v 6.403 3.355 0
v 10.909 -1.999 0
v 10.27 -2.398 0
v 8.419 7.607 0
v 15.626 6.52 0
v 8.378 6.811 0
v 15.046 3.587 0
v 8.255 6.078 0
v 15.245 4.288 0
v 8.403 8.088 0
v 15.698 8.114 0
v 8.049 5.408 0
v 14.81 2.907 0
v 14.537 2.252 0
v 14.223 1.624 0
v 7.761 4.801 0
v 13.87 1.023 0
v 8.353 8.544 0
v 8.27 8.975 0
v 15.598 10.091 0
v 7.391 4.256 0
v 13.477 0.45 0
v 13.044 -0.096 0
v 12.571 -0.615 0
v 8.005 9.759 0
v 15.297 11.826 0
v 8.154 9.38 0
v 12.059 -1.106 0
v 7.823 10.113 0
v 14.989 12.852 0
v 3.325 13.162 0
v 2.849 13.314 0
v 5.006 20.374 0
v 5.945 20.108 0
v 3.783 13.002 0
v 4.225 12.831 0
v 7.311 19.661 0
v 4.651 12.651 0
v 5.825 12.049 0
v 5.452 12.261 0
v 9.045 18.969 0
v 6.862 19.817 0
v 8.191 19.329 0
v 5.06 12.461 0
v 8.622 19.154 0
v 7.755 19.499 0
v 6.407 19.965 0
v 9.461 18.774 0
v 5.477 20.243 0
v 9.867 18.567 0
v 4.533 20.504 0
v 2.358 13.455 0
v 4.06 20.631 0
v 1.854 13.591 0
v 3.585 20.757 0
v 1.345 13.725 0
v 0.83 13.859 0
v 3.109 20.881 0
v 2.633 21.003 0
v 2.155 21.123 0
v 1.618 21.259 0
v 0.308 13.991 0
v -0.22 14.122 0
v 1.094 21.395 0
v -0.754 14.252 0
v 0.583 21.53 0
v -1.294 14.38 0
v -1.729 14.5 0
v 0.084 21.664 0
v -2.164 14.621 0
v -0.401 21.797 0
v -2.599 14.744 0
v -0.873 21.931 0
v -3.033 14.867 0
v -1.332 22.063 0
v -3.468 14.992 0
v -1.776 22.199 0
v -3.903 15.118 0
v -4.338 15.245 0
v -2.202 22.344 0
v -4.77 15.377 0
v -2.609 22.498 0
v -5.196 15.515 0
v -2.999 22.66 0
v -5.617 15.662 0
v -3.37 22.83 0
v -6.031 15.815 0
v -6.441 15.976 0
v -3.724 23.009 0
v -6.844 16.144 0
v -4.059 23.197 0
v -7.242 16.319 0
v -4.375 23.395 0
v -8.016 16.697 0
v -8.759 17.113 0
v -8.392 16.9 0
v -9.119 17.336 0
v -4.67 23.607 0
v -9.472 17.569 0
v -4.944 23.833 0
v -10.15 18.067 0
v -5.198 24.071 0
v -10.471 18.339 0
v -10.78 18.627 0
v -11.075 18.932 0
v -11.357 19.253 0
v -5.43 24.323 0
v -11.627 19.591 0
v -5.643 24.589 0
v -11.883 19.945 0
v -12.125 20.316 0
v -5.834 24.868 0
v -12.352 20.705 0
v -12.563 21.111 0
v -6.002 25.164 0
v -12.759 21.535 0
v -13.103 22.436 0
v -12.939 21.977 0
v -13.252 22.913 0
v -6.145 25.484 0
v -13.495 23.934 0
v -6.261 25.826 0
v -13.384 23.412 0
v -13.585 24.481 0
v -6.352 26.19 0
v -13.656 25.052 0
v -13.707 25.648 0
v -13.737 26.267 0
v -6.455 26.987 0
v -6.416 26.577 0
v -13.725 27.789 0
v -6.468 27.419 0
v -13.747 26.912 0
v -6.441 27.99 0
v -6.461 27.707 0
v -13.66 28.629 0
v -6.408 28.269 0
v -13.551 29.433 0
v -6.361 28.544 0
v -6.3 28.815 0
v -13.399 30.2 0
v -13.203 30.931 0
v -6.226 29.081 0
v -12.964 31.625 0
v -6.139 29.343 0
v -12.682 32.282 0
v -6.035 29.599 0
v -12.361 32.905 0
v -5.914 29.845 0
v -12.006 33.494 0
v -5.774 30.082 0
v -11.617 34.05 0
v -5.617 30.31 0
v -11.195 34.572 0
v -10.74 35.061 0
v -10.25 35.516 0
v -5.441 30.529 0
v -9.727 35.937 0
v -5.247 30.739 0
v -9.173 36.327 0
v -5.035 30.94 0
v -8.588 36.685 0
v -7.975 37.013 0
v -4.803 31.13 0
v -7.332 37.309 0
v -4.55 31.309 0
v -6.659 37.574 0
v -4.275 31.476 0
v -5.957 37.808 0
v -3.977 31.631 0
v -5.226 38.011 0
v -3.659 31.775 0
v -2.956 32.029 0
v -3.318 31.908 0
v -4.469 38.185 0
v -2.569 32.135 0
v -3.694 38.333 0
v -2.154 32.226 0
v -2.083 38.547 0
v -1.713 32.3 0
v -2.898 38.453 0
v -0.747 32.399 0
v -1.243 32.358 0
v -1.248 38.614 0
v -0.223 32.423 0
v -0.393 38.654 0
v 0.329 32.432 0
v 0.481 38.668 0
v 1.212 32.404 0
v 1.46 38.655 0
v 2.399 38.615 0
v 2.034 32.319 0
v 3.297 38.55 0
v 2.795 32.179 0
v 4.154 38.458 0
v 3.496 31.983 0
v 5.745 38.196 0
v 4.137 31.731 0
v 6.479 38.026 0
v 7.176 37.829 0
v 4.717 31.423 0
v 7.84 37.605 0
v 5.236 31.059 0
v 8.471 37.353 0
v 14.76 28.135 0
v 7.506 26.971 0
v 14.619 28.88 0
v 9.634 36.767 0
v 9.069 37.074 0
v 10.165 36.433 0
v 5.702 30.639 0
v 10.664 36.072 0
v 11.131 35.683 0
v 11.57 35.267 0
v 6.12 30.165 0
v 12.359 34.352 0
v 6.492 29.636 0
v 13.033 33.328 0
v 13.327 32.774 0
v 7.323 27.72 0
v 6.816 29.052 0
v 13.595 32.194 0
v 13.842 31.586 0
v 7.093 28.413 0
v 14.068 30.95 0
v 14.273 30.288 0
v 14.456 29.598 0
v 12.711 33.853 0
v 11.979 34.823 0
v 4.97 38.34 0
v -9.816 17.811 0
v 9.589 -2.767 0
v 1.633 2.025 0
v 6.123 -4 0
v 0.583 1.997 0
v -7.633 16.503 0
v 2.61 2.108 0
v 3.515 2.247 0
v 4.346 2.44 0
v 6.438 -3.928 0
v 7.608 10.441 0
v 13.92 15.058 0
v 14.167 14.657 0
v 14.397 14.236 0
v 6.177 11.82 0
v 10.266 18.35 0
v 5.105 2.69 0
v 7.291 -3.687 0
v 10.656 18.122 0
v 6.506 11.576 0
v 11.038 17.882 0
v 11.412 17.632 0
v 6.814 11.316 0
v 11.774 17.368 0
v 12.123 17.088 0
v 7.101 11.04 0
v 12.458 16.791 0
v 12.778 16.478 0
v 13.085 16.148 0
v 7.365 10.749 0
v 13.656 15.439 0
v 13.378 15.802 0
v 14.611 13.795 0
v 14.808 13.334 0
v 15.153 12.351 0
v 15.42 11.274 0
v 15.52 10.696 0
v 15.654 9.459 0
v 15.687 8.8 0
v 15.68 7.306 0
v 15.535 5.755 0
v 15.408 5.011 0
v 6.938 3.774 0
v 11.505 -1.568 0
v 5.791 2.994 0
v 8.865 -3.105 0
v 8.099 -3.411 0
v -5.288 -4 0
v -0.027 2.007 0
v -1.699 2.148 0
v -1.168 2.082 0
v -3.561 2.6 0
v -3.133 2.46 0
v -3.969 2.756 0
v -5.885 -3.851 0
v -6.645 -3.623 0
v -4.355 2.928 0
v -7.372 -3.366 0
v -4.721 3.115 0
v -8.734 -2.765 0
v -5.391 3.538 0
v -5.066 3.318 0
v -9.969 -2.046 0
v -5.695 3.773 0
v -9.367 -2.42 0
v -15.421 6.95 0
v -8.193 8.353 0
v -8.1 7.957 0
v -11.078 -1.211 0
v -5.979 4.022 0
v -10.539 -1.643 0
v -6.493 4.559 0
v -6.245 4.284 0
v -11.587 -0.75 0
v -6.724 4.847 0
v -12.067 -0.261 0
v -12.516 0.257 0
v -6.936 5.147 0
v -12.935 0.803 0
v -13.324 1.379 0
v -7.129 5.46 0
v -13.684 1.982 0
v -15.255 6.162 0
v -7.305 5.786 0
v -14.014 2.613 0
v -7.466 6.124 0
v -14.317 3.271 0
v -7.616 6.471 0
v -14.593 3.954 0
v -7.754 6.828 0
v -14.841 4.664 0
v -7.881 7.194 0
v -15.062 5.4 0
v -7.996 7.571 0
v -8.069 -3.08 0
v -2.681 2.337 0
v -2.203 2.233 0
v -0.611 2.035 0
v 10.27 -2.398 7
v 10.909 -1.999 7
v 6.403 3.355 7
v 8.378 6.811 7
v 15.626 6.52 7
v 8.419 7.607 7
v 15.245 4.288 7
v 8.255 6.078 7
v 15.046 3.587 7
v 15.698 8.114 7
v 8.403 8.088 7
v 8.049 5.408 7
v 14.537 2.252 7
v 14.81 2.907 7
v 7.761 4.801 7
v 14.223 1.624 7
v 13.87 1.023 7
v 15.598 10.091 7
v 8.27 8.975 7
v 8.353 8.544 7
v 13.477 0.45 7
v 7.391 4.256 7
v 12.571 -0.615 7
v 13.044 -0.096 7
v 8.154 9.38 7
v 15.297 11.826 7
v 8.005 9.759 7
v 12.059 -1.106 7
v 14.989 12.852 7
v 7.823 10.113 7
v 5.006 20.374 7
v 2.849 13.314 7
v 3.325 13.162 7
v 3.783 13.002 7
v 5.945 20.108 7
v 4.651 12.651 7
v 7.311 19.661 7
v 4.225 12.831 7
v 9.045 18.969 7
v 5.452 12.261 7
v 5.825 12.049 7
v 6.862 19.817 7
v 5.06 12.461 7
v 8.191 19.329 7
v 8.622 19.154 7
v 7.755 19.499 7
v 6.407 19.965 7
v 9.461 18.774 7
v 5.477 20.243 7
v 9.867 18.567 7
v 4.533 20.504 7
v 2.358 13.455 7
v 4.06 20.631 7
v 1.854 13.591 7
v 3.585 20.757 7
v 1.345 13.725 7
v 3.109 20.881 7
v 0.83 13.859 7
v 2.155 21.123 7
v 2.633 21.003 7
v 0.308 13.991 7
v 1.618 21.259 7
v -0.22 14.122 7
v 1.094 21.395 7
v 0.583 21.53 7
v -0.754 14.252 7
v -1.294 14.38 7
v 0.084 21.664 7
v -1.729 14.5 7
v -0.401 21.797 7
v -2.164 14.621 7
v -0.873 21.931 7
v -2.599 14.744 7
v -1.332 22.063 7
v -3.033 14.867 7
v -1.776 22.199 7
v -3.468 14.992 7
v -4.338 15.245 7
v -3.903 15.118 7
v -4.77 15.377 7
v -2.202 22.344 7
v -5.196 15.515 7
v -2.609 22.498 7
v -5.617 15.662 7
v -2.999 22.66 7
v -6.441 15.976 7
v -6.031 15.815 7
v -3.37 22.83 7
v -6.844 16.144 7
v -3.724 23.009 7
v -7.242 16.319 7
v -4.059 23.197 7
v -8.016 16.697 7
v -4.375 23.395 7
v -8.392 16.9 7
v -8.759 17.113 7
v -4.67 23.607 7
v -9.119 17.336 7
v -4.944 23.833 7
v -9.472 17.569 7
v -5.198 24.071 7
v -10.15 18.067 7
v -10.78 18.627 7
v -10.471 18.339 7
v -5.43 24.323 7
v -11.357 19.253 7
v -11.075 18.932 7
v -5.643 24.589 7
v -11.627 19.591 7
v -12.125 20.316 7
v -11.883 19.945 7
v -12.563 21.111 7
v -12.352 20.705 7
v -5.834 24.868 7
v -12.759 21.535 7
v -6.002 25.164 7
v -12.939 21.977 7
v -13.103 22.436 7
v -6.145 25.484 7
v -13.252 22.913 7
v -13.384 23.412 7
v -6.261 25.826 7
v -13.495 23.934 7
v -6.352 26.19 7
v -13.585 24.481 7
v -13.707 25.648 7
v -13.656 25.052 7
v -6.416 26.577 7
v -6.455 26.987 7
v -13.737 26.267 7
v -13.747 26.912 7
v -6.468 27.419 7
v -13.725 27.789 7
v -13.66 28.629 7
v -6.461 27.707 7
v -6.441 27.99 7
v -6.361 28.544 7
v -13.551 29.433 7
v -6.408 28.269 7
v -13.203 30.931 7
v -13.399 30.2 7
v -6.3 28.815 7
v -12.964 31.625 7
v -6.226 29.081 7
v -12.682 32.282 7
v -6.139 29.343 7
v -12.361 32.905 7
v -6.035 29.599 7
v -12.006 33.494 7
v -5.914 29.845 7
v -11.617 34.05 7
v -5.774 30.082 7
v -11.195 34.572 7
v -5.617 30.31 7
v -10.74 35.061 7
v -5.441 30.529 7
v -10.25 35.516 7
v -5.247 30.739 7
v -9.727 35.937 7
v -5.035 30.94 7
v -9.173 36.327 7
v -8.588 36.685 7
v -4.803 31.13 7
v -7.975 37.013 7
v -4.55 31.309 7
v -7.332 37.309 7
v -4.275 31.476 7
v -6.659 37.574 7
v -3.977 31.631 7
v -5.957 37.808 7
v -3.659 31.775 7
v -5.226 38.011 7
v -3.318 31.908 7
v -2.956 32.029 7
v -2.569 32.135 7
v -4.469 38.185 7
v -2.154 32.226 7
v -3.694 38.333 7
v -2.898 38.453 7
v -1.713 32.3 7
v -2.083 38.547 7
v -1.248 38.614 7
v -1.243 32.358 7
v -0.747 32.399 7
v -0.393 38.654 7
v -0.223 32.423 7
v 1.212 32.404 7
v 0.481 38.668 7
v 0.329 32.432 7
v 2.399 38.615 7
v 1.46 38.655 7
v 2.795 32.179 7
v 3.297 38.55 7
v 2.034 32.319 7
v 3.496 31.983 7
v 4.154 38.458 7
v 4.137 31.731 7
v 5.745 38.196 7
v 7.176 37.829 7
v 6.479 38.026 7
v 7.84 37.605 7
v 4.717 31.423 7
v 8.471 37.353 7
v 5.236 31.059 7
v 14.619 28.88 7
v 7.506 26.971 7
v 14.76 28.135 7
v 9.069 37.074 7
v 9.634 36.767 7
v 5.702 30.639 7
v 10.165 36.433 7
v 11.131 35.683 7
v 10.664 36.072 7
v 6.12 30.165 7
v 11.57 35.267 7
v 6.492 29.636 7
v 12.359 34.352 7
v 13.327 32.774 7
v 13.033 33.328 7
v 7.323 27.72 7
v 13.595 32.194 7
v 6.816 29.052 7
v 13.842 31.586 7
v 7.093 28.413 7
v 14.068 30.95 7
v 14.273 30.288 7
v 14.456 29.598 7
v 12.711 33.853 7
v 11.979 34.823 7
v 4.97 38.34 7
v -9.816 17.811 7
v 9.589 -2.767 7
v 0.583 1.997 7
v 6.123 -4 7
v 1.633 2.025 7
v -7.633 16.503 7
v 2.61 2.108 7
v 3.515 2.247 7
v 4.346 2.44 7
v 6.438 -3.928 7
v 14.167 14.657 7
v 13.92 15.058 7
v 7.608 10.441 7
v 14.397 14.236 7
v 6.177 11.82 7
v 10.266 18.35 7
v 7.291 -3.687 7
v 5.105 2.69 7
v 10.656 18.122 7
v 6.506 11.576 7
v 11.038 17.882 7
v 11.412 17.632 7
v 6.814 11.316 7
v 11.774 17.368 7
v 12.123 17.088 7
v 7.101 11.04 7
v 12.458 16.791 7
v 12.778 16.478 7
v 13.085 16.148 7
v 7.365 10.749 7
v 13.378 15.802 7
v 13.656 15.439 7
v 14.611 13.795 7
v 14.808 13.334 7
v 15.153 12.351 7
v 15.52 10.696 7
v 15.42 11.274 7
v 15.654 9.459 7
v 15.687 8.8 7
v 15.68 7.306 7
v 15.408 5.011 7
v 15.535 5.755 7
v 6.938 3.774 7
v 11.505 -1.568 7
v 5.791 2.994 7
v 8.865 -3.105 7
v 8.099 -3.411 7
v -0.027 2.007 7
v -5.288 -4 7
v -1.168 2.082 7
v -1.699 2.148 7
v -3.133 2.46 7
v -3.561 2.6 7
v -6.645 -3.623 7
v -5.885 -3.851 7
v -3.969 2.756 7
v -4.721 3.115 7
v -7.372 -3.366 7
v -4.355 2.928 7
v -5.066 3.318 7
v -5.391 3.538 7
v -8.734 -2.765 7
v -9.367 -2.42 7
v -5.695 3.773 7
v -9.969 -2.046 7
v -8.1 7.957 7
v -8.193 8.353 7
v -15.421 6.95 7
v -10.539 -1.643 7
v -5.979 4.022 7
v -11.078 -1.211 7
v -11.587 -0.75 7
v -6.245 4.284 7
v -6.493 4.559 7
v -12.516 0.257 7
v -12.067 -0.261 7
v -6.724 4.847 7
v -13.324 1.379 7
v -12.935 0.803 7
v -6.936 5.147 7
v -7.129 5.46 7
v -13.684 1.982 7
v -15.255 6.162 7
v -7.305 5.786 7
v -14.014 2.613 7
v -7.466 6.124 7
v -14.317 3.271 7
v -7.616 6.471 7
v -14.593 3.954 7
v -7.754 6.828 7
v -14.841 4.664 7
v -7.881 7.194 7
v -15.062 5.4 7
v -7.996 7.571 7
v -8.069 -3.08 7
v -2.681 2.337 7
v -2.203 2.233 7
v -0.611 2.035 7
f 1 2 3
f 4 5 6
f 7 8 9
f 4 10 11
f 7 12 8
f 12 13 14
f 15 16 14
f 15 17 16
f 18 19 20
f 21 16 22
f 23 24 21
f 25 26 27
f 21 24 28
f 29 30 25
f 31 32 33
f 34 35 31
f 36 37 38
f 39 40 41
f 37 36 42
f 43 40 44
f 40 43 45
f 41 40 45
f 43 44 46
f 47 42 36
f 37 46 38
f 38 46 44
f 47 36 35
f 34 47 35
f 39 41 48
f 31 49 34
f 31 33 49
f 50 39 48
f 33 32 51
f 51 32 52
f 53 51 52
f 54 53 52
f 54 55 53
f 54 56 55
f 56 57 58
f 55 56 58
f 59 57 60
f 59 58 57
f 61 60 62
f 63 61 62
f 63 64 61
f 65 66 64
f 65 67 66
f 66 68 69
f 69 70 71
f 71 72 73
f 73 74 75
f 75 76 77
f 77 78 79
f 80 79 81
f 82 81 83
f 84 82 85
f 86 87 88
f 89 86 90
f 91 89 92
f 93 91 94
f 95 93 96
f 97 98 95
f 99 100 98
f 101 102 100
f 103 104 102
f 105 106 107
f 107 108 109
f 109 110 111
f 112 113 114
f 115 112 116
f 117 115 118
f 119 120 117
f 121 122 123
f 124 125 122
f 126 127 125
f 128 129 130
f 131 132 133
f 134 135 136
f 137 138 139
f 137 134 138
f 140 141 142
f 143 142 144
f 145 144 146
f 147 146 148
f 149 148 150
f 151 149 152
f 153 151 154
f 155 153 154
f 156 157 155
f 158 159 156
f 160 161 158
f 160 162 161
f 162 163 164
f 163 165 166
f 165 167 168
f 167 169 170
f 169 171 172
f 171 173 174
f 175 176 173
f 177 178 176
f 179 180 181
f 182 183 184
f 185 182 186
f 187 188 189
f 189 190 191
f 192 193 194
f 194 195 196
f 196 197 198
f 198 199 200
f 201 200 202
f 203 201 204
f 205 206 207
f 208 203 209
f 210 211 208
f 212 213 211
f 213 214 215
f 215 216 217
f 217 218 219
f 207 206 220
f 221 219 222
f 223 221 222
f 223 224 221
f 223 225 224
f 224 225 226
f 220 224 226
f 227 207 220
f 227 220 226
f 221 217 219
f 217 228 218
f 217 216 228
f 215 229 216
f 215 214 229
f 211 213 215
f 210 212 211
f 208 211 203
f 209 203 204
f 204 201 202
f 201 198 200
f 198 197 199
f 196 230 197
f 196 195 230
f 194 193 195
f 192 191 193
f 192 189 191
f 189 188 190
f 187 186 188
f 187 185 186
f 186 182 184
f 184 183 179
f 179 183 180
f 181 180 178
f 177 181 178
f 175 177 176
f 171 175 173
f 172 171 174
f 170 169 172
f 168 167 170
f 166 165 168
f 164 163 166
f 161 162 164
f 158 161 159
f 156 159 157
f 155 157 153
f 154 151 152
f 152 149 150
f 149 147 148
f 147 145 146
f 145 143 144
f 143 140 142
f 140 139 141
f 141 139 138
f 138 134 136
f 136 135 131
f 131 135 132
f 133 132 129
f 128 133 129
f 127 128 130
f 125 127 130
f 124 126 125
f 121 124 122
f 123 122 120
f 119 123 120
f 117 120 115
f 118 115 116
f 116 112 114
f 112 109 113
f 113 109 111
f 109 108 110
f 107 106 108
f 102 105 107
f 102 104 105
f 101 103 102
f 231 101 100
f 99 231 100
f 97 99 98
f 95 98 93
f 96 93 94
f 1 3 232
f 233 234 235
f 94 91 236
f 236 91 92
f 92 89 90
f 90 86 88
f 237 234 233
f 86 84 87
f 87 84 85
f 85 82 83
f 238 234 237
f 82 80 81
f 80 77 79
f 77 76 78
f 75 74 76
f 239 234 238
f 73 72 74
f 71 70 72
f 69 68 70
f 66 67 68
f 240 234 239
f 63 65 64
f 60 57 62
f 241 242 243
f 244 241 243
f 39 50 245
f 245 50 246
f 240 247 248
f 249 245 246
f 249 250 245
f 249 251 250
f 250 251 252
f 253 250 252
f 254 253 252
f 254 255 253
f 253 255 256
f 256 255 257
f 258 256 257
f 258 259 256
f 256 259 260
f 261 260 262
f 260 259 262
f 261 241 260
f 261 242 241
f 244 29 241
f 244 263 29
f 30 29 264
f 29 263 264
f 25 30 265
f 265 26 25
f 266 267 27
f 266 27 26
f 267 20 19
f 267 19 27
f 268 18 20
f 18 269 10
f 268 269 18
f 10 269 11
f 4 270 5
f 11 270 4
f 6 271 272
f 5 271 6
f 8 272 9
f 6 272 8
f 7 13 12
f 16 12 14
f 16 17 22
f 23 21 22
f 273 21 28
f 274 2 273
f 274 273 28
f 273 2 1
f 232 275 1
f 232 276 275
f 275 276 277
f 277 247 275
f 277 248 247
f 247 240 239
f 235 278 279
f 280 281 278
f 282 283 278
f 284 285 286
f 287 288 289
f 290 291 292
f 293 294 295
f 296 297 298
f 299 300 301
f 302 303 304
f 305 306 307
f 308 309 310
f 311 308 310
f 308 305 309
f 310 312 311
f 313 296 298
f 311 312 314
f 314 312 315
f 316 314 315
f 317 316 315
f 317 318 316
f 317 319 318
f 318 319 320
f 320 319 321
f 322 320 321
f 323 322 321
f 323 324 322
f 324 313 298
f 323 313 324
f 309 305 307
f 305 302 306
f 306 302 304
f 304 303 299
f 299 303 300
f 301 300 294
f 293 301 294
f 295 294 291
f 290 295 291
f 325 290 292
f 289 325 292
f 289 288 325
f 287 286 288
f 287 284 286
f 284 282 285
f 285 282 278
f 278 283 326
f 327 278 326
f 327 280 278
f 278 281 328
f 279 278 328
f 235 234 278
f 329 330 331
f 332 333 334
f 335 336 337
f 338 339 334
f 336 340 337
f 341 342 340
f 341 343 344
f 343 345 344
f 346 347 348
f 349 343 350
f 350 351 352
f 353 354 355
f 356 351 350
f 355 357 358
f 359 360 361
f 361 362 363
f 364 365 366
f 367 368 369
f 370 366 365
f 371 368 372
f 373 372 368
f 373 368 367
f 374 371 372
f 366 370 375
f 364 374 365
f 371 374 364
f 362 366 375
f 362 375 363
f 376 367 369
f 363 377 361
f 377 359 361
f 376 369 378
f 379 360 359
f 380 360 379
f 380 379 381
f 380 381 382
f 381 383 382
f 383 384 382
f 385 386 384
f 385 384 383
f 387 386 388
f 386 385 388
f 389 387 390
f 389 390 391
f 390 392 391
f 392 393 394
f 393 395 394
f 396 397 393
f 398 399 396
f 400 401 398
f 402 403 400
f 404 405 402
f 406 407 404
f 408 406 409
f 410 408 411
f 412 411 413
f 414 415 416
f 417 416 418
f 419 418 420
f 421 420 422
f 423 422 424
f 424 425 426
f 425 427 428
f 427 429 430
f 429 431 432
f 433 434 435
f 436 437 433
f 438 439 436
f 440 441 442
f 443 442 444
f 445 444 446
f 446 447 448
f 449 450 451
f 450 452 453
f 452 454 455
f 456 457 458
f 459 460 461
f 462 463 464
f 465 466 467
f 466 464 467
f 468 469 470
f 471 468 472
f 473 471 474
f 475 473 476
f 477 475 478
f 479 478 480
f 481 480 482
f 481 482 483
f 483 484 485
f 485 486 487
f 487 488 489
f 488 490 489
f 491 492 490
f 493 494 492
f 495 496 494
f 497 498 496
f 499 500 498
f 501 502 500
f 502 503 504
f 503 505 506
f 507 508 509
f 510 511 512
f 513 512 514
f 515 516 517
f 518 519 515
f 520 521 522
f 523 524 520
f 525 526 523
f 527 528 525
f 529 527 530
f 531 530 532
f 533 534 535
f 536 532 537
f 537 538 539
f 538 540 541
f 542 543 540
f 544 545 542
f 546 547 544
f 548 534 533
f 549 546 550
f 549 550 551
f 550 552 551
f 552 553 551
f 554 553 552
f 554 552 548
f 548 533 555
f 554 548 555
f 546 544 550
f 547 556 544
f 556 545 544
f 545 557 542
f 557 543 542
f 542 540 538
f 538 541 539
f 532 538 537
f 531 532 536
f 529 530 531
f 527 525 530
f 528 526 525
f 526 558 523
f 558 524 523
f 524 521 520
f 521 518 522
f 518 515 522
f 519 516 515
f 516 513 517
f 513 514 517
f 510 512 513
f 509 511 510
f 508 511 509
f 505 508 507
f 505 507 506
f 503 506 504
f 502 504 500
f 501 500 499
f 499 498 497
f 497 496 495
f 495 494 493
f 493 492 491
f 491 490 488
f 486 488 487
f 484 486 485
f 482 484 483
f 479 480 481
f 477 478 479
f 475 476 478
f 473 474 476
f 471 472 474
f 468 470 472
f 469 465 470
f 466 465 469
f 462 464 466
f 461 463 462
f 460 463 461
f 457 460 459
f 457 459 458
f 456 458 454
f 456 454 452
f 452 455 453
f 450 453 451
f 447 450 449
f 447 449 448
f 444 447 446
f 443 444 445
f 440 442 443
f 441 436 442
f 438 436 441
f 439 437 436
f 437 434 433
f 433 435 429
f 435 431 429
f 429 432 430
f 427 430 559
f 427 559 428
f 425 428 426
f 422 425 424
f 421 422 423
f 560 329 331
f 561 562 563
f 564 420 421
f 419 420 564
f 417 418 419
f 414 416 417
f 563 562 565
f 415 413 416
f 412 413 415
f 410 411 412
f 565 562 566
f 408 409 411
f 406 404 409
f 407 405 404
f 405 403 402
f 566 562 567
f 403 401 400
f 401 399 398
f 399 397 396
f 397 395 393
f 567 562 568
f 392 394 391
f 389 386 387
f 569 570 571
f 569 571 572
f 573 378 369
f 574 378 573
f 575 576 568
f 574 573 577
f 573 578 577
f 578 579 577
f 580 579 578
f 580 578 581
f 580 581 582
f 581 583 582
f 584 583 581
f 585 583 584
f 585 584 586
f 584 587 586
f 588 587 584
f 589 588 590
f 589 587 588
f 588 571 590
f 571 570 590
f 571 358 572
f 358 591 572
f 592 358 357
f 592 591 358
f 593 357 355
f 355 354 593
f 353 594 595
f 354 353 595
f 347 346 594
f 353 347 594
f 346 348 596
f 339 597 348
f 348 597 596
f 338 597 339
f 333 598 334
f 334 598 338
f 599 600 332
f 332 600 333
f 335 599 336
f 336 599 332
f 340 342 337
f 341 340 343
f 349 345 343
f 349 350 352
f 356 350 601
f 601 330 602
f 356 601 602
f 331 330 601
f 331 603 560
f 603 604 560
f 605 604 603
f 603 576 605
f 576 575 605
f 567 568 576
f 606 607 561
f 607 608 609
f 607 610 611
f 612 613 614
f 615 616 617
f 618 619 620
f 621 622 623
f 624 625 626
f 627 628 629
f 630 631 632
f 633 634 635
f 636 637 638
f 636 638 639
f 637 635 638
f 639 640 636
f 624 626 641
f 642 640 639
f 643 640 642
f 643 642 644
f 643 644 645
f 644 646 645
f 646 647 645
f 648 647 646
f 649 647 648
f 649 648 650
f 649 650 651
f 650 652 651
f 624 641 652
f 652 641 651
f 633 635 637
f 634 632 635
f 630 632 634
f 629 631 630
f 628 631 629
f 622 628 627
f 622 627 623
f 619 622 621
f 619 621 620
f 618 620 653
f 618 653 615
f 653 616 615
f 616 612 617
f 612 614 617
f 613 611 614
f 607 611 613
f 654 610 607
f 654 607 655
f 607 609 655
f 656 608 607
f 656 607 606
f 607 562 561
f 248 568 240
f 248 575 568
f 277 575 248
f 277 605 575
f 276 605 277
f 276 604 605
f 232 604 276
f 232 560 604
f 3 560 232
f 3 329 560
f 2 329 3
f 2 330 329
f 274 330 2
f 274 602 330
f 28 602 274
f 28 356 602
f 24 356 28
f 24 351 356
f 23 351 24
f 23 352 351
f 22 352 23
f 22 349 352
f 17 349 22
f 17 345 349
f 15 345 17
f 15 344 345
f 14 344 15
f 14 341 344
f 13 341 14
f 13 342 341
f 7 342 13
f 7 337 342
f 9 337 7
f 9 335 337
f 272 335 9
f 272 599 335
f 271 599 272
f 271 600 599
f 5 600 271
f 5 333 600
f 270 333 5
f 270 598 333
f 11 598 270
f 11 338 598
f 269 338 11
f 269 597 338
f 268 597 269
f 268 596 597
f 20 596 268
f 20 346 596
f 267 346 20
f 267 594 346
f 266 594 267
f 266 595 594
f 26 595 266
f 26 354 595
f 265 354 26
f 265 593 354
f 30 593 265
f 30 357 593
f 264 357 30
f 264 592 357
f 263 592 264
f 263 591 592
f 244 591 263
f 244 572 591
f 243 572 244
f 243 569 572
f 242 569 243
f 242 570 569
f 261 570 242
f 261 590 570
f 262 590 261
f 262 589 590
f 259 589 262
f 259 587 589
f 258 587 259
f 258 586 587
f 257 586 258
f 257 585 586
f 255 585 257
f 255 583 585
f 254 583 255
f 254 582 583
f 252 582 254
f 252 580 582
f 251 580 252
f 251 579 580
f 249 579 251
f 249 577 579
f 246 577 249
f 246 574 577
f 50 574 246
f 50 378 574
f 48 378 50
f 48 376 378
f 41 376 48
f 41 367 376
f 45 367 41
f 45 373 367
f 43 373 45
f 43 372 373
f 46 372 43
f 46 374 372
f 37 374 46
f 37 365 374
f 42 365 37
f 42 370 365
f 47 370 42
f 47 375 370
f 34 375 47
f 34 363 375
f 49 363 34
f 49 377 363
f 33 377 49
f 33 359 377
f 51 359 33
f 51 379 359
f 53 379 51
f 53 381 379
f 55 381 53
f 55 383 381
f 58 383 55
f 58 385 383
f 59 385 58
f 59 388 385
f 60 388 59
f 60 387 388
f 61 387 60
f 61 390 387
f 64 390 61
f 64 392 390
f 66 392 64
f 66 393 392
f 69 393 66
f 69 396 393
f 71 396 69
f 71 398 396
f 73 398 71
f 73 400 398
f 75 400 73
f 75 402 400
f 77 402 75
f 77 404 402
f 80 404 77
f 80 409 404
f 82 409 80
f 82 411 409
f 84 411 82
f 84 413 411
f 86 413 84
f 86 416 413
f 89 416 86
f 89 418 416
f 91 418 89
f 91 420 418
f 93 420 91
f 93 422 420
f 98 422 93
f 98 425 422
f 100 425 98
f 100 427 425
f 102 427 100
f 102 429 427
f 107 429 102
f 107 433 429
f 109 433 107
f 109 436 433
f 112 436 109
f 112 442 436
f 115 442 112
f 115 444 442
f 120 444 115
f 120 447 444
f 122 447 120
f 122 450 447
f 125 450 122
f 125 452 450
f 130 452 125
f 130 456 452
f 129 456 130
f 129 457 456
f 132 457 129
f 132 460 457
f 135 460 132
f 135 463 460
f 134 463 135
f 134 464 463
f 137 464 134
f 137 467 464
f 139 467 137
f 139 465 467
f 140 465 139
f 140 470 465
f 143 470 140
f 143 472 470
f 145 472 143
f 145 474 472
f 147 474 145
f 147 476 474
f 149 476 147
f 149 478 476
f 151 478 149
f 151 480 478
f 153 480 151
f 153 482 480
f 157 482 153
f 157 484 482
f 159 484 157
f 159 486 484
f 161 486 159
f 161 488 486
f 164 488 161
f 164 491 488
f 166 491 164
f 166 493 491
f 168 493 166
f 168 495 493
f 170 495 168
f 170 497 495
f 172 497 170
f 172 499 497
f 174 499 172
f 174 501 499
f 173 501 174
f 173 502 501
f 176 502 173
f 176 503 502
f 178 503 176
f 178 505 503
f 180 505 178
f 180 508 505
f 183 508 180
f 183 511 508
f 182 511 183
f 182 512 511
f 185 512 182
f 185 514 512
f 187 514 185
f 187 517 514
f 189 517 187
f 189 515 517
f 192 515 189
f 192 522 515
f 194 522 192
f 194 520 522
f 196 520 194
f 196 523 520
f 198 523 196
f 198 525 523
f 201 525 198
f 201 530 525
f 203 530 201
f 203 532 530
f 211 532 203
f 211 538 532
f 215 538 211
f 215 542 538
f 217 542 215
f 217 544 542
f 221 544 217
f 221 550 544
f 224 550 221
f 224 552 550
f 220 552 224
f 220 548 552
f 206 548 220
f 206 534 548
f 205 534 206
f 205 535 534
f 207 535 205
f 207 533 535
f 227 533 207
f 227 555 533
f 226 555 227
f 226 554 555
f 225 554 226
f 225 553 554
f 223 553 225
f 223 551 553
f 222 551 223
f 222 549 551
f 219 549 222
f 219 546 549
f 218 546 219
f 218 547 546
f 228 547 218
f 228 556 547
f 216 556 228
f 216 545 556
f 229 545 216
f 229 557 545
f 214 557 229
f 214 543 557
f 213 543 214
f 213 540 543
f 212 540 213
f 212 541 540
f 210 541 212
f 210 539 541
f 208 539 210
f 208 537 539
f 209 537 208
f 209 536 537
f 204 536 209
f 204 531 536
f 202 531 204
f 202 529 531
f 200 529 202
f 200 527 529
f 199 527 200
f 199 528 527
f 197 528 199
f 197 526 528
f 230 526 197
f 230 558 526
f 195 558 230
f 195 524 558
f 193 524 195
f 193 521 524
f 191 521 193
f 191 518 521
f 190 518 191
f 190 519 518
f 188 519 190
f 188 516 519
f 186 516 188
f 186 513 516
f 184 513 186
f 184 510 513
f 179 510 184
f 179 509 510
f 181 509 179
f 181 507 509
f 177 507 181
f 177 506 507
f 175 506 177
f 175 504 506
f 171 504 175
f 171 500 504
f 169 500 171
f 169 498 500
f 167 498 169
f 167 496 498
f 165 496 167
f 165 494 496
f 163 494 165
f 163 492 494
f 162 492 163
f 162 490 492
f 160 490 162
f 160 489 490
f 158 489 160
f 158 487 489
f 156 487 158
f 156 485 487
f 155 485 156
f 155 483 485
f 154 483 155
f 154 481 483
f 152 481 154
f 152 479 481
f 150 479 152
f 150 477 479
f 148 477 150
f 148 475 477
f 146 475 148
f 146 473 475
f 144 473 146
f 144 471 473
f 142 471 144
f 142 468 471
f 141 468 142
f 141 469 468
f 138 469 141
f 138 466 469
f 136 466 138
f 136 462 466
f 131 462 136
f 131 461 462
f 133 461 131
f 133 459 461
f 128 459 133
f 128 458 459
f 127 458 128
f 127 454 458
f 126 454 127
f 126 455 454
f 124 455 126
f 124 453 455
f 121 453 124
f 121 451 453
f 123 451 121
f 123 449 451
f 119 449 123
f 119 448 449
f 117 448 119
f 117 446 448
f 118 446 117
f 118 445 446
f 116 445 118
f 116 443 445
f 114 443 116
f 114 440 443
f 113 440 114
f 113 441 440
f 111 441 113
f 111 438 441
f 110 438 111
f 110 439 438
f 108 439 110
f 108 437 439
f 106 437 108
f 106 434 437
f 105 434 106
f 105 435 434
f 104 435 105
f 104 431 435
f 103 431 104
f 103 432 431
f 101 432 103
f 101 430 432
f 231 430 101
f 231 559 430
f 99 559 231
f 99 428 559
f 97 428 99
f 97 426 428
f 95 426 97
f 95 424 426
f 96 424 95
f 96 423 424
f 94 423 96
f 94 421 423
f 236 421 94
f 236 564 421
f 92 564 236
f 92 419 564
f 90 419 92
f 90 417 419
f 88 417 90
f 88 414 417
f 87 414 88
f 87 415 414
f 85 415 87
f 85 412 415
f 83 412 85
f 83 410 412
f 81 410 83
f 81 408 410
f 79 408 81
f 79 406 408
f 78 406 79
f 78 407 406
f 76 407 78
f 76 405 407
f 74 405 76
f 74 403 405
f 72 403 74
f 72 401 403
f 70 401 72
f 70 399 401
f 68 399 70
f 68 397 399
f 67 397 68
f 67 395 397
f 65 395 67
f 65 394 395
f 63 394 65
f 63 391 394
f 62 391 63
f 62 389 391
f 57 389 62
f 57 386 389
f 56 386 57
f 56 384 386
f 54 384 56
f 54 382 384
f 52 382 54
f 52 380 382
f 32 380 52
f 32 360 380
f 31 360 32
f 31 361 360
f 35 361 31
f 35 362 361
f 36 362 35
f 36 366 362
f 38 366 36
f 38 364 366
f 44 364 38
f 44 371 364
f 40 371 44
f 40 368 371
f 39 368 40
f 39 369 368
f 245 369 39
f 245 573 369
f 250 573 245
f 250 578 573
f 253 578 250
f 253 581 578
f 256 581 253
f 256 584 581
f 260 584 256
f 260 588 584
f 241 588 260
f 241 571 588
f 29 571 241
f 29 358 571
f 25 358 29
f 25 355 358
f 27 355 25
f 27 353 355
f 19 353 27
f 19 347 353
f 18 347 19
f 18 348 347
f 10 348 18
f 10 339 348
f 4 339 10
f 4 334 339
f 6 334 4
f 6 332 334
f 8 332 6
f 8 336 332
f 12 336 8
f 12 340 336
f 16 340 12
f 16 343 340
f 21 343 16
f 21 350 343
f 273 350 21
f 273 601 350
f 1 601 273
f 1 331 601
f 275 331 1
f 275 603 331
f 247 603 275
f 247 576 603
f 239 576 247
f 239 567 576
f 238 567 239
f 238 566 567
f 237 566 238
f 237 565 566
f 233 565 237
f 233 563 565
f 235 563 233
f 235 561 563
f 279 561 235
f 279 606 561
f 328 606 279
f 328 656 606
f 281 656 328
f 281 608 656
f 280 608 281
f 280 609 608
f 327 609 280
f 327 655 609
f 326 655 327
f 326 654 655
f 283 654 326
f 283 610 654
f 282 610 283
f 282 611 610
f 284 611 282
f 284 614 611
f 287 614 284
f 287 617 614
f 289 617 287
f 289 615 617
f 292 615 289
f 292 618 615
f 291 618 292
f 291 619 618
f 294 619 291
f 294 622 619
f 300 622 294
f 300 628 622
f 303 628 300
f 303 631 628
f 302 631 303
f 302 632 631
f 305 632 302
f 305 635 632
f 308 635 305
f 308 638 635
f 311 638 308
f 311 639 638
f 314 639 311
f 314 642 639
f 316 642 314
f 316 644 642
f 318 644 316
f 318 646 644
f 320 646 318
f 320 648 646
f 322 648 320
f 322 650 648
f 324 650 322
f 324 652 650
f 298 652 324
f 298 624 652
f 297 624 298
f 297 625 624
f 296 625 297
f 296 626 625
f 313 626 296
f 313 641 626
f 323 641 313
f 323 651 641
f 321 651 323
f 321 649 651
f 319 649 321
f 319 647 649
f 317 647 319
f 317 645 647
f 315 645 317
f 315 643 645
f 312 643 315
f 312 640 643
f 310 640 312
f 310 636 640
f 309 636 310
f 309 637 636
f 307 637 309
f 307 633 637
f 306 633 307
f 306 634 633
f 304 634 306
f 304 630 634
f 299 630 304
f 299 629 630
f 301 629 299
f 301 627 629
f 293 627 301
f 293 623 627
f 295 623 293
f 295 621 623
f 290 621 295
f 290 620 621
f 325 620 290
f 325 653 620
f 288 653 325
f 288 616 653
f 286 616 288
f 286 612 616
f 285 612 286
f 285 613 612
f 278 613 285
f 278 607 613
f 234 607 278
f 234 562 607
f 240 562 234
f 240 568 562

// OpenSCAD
// file: glyph.scad
// glyph — the shared geometry of every letter in the set. Defines named geometry
// only, so it renders nothing on its own; each letter part includes it and calls
// letter(). Every dimension lives in ../../lib/common.scad.
//
// A LETTER IS NOTHING BUT A LETTER. No plinth, no tongue, no tab — it is the
// bare glyph, and it attaches by standing in the deck groove and resting on the
// groove's floor. Anything else on it would be a distraction on a learning toy.
//
// It is a flat plate of one thickness, printed face-down: no overhang anywhere,
// no supports, and the face on the bed comes out smoothest.
//
// TWO TRAPS WITH text():
//
//  * A missing font FALLS BACK SILENTLY — no warning, no error, just different
//    letters. "Liberation Sans" was the first choice here because OpenSCAD
//    bundles it; on macOS the bundled faces are not registered with fontconfig,
//    so it rendered the fallback face instead and nothing said so. To check a
//    font resolved, render a string with it and with a deliberately bogus name
//    and compare bounding boxes: identical means it fell back.
//  * `size` is not the cap height in general. For Helvetica Bold they coincide
//    (size 44 -> 44.0 mm cap), which is why letter_size reads as a height.
//    Change the font and re-measure.

include <../../lib/common.scad>

// The letter's outline, upright in the XY plane, ready to be extruded along Z
// (which is the letter's thickness, and the print's build axis).
//
//   y = 0   is the deck surface
//   y < 0   is the part standing down inside the groove. It reaches letter_bury,
//           which is where the tapered groove closes to letter_t — NOT the
//           groove's floor. The letter wedges; it never bottoms out.
module glyph_2d(ch) {
    intersection() {
        translate([0, -letter_bury])
            scale([letter_condense, 1])
                text(ch, size = letter_size, font = letter_font,
                     halign = "center", valign = "baseline");
        // Trimmed flat at the baseline. Round letters (O, C, G, S) overshoot the
        // baseline by design, and a letter standing on a convex curve rocks —
        // there is nothing to stop it leaning. The trim costs nothing visible
        // and gives every letter a flat foot on the groove floor.
        translate([-200, -letter_bury]) square([400, 400]);
    }
}

// One letter, in its print orientation: lying on its face, thickness up Z.
module letter(ch) {
    linear_extrude(letter_t) glyph_2d(ch);
}

// Where that letter sits once it is dropped into a chassis, for fit checks.
module letter_fitted(ch) {
    translate([0, letter_t/2, body_top]) rotate([90, 0, 0]) letter(ch);
}
// main file
// letter S — one part. See glyph.scad for the geometry and lib/common.scad for
// the dimensions. Prints lying on its face, exactly as exported: no supports.

include <glyph.scad>

letter("S");
